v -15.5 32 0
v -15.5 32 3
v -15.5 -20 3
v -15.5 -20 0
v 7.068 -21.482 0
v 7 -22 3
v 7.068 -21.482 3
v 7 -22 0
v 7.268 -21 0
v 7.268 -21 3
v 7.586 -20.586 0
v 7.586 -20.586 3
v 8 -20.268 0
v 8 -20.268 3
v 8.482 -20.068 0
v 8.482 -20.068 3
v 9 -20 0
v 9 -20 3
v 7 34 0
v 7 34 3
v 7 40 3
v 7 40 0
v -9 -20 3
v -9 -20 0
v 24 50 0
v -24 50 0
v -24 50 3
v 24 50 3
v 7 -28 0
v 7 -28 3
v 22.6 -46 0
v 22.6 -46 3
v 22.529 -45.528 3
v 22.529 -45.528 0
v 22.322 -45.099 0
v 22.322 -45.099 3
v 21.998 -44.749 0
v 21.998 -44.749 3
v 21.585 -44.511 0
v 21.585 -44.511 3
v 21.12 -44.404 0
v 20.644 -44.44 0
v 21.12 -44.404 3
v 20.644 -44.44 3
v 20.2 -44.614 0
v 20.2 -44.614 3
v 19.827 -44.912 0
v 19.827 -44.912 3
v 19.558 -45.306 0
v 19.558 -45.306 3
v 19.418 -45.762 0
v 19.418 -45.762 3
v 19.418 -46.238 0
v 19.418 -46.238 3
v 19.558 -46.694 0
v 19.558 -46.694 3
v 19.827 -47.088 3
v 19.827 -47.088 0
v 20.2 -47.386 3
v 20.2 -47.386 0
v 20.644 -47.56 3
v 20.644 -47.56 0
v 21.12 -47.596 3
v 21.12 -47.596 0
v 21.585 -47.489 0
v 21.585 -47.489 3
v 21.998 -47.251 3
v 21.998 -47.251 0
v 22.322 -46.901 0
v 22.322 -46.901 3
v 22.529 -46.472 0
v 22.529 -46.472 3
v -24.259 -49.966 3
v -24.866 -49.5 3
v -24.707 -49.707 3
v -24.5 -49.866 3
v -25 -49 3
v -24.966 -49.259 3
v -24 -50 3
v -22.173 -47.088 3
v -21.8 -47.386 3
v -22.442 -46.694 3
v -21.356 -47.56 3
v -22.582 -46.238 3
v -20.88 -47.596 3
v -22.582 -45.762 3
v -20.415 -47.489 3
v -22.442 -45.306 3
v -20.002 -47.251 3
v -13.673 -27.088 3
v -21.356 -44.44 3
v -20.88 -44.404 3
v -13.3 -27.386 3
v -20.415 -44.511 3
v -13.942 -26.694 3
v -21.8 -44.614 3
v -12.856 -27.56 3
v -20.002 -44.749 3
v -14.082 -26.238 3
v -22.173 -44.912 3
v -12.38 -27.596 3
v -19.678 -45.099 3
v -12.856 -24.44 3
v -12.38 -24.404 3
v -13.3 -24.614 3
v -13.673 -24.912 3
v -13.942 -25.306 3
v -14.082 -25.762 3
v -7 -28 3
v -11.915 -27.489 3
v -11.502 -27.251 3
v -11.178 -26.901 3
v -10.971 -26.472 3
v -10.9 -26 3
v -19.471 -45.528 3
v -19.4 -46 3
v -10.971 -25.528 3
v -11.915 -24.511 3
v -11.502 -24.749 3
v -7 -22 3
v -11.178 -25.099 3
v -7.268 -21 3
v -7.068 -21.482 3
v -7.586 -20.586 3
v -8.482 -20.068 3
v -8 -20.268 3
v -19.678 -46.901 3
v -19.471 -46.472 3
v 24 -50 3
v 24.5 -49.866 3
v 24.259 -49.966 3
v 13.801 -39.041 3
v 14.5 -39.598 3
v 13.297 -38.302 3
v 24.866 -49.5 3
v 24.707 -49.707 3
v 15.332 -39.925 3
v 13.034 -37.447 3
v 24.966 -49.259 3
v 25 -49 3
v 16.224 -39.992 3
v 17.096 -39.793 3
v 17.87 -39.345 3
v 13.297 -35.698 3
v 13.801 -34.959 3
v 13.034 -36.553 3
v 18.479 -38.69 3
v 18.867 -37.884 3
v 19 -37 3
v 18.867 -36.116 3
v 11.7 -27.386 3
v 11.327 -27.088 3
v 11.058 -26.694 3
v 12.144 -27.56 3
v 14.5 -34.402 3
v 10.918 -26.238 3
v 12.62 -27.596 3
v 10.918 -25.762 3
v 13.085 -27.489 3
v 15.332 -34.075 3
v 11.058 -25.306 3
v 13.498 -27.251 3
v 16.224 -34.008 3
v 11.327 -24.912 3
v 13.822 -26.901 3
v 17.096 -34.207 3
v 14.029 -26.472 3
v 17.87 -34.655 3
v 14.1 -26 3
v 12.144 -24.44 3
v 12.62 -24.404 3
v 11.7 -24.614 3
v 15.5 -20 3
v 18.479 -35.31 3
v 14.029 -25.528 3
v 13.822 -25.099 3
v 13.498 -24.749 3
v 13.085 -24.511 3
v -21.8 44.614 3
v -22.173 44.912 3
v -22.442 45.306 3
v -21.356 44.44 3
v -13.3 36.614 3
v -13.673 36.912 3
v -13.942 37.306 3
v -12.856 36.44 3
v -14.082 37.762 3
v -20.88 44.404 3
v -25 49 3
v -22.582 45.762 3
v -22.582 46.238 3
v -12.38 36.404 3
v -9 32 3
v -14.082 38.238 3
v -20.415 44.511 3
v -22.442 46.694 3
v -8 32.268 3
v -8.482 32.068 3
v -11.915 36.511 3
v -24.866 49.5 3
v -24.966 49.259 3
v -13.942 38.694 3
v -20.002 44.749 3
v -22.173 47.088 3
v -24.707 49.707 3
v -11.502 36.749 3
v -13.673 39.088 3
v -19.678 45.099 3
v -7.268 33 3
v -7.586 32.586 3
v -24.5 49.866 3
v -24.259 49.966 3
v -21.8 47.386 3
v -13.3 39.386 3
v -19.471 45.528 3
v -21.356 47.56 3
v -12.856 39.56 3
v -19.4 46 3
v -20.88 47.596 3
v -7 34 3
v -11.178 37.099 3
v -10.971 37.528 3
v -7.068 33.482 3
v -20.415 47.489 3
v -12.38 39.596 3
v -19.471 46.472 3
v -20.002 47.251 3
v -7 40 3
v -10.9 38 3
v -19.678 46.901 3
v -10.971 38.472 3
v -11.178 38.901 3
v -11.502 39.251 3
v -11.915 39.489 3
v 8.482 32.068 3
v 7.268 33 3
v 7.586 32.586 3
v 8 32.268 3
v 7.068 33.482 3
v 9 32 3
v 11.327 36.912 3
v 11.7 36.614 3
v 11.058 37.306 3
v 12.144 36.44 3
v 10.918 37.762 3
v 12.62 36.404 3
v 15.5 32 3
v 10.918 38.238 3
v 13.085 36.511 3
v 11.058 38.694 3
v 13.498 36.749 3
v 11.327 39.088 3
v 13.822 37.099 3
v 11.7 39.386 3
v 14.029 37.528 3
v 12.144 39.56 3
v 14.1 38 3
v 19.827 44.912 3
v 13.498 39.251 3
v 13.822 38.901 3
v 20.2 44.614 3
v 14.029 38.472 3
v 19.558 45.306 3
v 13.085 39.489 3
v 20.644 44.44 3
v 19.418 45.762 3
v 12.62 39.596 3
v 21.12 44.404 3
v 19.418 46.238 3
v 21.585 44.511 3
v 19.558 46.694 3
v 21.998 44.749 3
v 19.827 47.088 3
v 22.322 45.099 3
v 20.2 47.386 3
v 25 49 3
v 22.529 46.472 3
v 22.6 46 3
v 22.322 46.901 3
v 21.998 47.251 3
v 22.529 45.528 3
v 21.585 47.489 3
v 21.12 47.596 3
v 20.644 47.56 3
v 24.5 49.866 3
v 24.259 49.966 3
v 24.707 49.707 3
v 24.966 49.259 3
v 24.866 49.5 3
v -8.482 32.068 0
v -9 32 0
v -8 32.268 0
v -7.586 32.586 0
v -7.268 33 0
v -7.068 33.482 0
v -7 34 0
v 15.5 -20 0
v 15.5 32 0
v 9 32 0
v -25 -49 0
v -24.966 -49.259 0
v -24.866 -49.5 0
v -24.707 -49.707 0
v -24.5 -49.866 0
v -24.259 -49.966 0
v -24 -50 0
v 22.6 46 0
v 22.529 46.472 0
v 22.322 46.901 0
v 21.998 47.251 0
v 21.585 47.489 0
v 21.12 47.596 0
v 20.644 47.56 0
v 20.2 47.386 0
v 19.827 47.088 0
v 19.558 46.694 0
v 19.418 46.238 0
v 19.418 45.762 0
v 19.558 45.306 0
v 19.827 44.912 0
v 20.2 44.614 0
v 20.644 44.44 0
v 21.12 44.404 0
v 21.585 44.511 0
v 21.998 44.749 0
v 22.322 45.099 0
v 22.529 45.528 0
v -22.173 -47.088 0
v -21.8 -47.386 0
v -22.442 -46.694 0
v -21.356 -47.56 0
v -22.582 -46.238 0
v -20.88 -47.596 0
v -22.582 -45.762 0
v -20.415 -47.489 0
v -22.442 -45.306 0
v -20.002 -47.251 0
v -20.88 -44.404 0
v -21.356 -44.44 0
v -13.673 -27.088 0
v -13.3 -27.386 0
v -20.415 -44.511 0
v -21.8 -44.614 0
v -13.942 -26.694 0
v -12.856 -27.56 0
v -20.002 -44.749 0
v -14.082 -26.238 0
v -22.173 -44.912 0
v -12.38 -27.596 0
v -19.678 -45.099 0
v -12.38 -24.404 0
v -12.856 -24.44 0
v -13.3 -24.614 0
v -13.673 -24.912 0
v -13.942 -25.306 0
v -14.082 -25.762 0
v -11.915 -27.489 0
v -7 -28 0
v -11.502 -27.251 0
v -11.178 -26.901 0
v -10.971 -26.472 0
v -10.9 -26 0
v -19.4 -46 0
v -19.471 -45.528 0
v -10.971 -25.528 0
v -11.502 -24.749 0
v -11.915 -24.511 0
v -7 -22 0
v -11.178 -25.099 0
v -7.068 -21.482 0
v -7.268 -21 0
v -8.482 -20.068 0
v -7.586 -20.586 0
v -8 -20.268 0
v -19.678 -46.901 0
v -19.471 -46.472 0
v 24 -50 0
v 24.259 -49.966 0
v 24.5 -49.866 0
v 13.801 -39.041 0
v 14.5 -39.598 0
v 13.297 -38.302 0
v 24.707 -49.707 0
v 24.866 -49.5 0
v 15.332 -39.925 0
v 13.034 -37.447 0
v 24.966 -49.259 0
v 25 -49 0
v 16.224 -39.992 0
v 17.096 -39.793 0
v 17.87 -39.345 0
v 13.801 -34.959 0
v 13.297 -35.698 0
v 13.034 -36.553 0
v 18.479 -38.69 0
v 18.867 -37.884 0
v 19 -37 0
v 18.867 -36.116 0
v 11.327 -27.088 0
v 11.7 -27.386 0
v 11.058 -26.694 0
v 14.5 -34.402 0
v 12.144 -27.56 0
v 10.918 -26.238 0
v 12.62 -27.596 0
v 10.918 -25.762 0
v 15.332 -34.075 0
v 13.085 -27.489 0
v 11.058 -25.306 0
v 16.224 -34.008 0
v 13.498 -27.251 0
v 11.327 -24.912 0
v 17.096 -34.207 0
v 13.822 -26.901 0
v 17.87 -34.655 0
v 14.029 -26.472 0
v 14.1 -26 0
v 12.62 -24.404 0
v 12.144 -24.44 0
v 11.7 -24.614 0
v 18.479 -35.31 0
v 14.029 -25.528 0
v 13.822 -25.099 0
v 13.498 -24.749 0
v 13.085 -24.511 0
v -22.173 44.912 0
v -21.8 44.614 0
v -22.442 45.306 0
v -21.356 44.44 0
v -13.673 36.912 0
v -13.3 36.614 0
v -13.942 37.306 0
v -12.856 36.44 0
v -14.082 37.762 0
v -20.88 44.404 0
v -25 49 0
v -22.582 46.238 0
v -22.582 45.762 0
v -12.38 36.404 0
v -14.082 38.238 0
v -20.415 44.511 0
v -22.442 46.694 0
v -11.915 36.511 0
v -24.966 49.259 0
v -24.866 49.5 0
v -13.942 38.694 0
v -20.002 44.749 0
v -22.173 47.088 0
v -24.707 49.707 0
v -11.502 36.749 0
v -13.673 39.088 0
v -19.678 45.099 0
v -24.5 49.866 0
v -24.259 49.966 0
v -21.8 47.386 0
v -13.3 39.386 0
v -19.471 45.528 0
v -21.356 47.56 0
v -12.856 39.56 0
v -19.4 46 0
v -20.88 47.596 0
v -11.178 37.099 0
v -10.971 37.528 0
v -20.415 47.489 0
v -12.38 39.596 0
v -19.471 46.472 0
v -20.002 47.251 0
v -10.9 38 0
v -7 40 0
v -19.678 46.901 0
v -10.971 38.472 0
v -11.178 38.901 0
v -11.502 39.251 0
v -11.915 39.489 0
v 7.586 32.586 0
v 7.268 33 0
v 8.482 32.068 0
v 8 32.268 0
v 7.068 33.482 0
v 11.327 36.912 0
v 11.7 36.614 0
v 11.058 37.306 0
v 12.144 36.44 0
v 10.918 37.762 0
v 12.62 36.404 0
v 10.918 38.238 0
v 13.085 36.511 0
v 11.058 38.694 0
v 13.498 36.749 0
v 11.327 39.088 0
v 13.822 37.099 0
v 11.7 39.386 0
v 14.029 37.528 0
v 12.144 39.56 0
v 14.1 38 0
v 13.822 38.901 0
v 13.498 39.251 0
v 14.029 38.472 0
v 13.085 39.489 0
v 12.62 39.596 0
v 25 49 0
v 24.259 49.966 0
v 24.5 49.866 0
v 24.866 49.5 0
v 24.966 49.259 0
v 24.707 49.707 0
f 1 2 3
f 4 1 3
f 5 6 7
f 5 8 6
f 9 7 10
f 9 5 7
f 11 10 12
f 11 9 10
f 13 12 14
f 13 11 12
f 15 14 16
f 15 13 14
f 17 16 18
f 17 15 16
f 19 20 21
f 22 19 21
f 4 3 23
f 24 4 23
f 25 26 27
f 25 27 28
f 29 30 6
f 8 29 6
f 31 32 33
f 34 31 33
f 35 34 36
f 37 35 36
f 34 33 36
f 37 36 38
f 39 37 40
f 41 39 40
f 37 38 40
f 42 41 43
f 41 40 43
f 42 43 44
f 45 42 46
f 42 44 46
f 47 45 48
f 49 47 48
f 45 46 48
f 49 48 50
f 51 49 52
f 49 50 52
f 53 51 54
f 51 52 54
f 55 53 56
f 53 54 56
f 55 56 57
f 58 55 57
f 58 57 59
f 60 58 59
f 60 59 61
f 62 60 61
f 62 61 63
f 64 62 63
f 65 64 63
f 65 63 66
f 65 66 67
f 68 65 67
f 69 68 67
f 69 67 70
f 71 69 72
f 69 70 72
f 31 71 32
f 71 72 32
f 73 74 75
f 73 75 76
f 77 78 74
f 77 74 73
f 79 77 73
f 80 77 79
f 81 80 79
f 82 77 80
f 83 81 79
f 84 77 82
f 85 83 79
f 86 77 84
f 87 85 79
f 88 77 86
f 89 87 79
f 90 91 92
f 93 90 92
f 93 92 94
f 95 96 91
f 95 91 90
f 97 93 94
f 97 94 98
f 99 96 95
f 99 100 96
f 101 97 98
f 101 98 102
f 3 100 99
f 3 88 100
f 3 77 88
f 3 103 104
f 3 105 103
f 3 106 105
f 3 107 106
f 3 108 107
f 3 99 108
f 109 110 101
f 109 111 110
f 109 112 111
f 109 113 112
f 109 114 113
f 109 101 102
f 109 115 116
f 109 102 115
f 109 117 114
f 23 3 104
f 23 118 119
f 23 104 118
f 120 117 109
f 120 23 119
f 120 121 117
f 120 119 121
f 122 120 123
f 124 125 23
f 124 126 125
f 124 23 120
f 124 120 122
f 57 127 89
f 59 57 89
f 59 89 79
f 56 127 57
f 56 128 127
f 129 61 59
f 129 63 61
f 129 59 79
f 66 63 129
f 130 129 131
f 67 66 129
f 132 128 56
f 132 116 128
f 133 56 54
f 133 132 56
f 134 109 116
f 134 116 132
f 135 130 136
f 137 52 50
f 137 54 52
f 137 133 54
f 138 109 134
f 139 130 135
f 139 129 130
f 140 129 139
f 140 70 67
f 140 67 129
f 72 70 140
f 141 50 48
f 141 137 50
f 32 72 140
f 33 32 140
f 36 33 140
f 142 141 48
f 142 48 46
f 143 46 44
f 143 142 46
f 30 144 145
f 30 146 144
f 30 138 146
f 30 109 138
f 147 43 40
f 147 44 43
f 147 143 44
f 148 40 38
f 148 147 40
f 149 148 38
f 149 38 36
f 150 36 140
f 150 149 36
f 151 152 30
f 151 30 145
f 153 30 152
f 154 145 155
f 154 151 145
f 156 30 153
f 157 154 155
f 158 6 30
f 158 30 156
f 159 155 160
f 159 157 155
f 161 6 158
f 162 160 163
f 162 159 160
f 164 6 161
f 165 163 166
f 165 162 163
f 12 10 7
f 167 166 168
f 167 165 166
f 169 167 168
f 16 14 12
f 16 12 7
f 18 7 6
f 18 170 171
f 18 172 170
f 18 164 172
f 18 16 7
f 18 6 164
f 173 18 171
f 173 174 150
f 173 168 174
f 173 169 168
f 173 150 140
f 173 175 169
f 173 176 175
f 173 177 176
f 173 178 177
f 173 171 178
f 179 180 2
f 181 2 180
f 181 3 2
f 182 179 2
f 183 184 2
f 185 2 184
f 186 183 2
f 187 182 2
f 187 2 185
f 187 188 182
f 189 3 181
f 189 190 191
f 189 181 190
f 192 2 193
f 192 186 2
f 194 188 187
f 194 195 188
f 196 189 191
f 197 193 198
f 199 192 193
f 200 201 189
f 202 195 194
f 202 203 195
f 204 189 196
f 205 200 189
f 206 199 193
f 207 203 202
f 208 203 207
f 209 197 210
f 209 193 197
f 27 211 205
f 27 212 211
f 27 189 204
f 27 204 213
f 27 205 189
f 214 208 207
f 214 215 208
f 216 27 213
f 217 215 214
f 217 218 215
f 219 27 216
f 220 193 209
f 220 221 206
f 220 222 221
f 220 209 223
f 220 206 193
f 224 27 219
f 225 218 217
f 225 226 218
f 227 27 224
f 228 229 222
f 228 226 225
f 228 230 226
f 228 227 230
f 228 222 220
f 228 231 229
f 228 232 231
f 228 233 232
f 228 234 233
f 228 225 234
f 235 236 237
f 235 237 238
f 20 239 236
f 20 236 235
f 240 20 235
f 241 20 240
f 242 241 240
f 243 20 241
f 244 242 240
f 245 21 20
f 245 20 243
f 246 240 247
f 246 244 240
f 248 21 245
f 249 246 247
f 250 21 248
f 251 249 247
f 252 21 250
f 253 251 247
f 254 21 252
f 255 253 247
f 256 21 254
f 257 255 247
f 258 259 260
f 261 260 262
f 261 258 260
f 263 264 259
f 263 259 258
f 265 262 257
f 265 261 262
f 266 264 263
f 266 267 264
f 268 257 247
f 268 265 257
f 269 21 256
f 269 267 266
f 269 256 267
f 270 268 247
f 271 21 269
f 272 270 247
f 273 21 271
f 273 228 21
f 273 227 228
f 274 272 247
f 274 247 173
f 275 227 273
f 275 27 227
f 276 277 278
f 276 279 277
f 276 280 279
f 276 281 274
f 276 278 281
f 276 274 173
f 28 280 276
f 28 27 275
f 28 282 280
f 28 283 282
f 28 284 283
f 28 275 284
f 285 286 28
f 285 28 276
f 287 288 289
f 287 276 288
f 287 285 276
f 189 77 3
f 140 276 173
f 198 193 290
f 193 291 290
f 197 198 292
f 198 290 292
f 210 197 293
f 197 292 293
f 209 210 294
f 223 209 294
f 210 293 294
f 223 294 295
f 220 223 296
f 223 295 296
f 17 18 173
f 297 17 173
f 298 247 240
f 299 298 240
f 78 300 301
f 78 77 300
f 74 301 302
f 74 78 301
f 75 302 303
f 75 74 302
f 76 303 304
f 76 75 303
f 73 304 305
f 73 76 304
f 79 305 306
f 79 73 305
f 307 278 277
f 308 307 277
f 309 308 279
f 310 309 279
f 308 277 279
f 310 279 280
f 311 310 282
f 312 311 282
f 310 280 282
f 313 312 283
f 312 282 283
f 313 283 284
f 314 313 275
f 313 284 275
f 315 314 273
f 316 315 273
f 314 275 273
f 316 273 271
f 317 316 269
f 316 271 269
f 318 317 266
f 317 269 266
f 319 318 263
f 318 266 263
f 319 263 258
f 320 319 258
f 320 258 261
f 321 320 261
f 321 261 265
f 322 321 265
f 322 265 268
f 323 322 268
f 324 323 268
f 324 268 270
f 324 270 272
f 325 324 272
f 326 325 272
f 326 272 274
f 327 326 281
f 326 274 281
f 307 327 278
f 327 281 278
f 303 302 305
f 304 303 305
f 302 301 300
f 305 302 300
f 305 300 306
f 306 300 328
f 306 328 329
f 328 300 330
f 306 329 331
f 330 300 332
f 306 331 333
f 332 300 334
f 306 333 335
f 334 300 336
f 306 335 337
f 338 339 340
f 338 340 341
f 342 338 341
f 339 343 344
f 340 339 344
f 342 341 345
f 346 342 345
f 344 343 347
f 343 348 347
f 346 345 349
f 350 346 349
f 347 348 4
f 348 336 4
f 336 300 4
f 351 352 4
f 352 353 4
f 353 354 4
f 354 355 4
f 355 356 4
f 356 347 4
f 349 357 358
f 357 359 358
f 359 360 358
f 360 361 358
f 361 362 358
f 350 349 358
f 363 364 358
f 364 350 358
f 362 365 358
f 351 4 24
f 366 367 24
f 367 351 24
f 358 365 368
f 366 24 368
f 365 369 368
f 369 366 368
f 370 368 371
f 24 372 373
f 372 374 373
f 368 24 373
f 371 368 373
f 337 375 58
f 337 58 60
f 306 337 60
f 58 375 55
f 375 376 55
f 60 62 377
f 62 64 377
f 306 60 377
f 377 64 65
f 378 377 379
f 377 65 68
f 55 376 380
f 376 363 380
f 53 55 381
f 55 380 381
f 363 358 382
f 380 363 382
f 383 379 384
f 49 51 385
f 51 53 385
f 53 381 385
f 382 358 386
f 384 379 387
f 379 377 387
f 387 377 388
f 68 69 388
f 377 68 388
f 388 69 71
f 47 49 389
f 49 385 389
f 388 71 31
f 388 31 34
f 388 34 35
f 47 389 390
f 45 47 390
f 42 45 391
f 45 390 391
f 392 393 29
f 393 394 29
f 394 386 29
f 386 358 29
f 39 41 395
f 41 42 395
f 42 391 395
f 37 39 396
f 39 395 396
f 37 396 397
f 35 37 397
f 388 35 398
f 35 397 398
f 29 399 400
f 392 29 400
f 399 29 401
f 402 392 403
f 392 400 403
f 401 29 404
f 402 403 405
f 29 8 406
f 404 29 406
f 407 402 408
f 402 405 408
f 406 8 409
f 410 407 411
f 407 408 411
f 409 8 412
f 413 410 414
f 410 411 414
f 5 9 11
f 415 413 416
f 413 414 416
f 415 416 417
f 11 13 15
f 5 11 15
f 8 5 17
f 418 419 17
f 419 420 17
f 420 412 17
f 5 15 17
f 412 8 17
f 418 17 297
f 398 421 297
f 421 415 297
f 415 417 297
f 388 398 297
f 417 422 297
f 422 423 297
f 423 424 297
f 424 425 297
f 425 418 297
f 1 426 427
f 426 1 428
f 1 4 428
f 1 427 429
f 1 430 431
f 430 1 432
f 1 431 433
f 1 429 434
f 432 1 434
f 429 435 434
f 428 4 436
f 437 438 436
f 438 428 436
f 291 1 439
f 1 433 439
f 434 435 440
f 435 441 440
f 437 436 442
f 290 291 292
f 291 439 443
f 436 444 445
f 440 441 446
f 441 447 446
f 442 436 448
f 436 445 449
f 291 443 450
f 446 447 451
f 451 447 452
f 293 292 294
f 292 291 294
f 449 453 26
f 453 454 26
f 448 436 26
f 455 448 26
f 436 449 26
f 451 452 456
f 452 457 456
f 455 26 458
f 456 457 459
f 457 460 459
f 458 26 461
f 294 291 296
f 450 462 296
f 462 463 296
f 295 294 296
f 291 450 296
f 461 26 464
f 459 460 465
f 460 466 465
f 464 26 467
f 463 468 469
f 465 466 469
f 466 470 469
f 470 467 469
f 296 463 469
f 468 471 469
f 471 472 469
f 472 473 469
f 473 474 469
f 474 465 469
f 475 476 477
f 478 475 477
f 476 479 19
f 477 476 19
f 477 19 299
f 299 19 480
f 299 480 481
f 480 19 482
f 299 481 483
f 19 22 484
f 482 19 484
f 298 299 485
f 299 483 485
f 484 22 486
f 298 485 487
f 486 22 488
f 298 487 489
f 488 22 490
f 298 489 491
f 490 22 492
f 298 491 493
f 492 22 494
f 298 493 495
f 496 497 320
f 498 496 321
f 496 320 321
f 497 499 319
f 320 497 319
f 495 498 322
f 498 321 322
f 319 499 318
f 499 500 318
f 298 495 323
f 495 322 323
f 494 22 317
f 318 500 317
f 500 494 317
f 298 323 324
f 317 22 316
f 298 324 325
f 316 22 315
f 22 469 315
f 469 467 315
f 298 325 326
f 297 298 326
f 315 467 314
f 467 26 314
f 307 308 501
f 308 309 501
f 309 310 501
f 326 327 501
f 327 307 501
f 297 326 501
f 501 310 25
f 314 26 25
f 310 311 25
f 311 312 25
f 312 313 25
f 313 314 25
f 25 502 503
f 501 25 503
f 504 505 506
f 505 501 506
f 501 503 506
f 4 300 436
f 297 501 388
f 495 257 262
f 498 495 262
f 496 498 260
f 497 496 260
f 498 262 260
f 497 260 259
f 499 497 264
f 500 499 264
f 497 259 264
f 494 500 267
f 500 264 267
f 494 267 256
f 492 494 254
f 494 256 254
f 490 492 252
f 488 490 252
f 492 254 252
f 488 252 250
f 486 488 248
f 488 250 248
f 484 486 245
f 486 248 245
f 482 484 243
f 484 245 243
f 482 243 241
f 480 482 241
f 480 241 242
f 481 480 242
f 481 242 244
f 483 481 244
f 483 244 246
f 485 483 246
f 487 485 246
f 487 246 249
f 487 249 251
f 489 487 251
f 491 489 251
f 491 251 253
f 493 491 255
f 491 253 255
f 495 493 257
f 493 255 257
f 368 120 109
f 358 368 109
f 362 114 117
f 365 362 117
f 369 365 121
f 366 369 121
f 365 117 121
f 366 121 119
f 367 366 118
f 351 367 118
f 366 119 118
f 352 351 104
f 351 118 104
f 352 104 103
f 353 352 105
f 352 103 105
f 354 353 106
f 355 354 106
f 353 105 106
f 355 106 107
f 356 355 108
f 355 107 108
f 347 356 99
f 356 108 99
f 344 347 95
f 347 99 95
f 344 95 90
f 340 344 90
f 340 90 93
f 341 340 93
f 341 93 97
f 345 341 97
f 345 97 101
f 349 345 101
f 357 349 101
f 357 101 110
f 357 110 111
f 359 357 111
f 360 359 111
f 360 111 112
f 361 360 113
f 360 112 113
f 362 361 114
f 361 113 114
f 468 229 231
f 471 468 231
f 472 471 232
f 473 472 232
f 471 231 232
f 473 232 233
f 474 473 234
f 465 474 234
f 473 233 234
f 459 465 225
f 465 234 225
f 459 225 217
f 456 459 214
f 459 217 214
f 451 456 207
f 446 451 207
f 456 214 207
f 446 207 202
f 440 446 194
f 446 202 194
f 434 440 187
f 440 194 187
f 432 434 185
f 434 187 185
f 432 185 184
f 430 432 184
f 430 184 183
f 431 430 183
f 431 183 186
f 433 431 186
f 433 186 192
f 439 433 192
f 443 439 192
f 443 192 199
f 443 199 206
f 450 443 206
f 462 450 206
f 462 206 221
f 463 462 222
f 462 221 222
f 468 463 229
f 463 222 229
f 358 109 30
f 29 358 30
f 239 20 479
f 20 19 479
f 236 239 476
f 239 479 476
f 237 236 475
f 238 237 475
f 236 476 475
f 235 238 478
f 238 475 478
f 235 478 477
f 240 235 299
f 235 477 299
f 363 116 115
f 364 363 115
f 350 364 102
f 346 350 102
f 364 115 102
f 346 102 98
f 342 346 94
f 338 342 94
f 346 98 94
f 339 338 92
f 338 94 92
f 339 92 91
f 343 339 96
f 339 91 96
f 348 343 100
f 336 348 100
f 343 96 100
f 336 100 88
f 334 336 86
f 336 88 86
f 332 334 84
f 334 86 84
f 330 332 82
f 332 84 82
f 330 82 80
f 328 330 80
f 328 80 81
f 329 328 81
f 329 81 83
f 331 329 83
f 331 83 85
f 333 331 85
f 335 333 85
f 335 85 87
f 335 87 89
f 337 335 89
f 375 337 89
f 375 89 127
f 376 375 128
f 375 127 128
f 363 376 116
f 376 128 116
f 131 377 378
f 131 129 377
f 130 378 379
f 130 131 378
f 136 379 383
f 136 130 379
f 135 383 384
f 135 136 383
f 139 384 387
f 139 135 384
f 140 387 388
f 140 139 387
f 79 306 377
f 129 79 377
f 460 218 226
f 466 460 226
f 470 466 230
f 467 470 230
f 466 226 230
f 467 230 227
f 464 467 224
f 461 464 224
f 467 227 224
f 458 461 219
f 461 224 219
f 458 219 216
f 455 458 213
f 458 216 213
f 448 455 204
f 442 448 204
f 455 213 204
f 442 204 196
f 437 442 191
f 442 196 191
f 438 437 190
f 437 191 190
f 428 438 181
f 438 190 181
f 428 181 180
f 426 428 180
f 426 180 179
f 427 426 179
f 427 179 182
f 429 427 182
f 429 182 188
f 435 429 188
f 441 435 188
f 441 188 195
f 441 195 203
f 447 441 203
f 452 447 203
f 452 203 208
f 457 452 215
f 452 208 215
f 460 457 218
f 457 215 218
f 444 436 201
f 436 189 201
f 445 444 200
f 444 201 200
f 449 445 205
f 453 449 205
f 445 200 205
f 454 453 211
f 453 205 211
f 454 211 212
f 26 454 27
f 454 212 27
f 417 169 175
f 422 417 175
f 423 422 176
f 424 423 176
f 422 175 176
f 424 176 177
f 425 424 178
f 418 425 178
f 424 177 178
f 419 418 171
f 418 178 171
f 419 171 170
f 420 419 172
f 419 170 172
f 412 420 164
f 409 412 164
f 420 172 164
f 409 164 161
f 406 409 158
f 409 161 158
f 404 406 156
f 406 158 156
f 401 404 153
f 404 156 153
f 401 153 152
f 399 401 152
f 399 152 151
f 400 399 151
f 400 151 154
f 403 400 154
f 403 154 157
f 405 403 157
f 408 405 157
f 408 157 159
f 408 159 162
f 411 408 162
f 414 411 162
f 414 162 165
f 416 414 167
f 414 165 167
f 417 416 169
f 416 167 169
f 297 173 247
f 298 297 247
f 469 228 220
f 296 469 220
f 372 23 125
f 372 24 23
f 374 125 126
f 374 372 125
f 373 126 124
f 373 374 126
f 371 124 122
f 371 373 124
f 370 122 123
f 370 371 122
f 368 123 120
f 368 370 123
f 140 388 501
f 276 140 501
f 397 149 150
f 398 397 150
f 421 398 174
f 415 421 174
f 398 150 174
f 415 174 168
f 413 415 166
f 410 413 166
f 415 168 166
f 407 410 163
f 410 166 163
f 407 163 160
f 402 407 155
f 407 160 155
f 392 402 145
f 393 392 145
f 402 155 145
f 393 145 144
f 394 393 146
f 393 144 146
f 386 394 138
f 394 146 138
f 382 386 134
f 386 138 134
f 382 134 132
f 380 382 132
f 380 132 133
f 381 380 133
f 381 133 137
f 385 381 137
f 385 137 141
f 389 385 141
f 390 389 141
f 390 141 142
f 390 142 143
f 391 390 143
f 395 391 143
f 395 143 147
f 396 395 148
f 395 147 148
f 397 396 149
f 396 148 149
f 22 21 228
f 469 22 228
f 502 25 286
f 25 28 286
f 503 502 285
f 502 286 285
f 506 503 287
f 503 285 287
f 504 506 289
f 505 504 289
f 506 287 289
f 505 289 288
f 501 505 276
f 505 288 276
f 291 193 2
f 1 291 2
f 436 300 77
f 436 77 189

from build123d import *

# Parameters (mm, degrees)
SKETCH_W        = 50
SKETCH_H        = 100
PAD_DEPTH       = 3
SKETCH001_R     = 1.6
POCKET_DEPTH    = 3
SKETCH002_R     = 1.6
POCKET001_DEPTH = 3
SKETCH003_R     = 3
POCKET002_DEPTH = 3
FILLET_R        = 1
FILLET001_R     = 2


with BuildPart() as part:
    # Sketch → Pad (new body)
    with BuildSketch(Plane.XY):
        Rectangle(SKETCH_W, SKETCH_H)
    extrude(amount=PAD_DEPTH)

    # Sketch001 (on Face6 of Pad) → Pocket (cut)
    with BuildSketch(Plane.XY.offset(3)):
        with Locations((-21, 46)):
            Circle(SKETCH001_R)
        with Locations((21, 46)):
            Circle(SKETCH001_R)
        with Locations((-21, -46)):
            Circle(SKETCH001_R)
        with Locations((21, -46)):
            Circle(SKETCH001_R)
    extrude(amount=-POCKET_DEPTH, mode=Mode.SUBTRACT)

    # Sketch002 (on Face5 of Pocket) → Pocket001 (cut)
    with BuildSketch(Plane.XY.offset(3)):
        with Locations((-12.5, 38)):
            Circle(SKETCH002_R)
        with Locations((12.5, 38)):
            Circle(SKETCH002_R)
        with Locations((-12.5, -26)):
            Circle(SKETCH002_R)
        with Locations((12.5, -26)):
            Circle(SKETCH002_R)
        Polygon((-15.5, 32), (-15.5, -20), (-7, -20), (-7, -28), (7, -28), (7, -20), (15.5, -20), (15.5, 32), (7, 32), (7, 40), (-7, 40), (-7, 32), align=None)
    extrude(amount=-POCKET001_DEPTH, mode=Mode.SUBTRACT)

    # Sketch003 (on Face5 of Pocket001) → Pocket002 (cut)
    with BuildSketch(Plane.XY.offset(3)):
        with Locations((16, -37)):
            Circle(SKETCH003_R)
    extrude(amount=-POCKET002_DEPTH, mode=Mode.SUBTRACT)

    # Fillet
    fillet_edges = [part.edges().sort_by_distance(p)[0] for p in [
        (25, -50, 1.5),
        (-25, -50, 1.5),
        (25, 50, 1.5),
        (-25, 50, 1.5),
    ]]
    fillet(fillet_edges, radius=FILLET_R)

    # Fillet001
    fillet001_edges = [part.edges().sort_by_distance(p)[0] for p in [
        (-7, 32, 1.5),
        (7, 32, 1.5),
        (-7, -20, 1.5),
        (7, -20, 1.5),
    ]]
    fillet(fillet001_edges, radius=FILLET001_R)


solid = part.part
